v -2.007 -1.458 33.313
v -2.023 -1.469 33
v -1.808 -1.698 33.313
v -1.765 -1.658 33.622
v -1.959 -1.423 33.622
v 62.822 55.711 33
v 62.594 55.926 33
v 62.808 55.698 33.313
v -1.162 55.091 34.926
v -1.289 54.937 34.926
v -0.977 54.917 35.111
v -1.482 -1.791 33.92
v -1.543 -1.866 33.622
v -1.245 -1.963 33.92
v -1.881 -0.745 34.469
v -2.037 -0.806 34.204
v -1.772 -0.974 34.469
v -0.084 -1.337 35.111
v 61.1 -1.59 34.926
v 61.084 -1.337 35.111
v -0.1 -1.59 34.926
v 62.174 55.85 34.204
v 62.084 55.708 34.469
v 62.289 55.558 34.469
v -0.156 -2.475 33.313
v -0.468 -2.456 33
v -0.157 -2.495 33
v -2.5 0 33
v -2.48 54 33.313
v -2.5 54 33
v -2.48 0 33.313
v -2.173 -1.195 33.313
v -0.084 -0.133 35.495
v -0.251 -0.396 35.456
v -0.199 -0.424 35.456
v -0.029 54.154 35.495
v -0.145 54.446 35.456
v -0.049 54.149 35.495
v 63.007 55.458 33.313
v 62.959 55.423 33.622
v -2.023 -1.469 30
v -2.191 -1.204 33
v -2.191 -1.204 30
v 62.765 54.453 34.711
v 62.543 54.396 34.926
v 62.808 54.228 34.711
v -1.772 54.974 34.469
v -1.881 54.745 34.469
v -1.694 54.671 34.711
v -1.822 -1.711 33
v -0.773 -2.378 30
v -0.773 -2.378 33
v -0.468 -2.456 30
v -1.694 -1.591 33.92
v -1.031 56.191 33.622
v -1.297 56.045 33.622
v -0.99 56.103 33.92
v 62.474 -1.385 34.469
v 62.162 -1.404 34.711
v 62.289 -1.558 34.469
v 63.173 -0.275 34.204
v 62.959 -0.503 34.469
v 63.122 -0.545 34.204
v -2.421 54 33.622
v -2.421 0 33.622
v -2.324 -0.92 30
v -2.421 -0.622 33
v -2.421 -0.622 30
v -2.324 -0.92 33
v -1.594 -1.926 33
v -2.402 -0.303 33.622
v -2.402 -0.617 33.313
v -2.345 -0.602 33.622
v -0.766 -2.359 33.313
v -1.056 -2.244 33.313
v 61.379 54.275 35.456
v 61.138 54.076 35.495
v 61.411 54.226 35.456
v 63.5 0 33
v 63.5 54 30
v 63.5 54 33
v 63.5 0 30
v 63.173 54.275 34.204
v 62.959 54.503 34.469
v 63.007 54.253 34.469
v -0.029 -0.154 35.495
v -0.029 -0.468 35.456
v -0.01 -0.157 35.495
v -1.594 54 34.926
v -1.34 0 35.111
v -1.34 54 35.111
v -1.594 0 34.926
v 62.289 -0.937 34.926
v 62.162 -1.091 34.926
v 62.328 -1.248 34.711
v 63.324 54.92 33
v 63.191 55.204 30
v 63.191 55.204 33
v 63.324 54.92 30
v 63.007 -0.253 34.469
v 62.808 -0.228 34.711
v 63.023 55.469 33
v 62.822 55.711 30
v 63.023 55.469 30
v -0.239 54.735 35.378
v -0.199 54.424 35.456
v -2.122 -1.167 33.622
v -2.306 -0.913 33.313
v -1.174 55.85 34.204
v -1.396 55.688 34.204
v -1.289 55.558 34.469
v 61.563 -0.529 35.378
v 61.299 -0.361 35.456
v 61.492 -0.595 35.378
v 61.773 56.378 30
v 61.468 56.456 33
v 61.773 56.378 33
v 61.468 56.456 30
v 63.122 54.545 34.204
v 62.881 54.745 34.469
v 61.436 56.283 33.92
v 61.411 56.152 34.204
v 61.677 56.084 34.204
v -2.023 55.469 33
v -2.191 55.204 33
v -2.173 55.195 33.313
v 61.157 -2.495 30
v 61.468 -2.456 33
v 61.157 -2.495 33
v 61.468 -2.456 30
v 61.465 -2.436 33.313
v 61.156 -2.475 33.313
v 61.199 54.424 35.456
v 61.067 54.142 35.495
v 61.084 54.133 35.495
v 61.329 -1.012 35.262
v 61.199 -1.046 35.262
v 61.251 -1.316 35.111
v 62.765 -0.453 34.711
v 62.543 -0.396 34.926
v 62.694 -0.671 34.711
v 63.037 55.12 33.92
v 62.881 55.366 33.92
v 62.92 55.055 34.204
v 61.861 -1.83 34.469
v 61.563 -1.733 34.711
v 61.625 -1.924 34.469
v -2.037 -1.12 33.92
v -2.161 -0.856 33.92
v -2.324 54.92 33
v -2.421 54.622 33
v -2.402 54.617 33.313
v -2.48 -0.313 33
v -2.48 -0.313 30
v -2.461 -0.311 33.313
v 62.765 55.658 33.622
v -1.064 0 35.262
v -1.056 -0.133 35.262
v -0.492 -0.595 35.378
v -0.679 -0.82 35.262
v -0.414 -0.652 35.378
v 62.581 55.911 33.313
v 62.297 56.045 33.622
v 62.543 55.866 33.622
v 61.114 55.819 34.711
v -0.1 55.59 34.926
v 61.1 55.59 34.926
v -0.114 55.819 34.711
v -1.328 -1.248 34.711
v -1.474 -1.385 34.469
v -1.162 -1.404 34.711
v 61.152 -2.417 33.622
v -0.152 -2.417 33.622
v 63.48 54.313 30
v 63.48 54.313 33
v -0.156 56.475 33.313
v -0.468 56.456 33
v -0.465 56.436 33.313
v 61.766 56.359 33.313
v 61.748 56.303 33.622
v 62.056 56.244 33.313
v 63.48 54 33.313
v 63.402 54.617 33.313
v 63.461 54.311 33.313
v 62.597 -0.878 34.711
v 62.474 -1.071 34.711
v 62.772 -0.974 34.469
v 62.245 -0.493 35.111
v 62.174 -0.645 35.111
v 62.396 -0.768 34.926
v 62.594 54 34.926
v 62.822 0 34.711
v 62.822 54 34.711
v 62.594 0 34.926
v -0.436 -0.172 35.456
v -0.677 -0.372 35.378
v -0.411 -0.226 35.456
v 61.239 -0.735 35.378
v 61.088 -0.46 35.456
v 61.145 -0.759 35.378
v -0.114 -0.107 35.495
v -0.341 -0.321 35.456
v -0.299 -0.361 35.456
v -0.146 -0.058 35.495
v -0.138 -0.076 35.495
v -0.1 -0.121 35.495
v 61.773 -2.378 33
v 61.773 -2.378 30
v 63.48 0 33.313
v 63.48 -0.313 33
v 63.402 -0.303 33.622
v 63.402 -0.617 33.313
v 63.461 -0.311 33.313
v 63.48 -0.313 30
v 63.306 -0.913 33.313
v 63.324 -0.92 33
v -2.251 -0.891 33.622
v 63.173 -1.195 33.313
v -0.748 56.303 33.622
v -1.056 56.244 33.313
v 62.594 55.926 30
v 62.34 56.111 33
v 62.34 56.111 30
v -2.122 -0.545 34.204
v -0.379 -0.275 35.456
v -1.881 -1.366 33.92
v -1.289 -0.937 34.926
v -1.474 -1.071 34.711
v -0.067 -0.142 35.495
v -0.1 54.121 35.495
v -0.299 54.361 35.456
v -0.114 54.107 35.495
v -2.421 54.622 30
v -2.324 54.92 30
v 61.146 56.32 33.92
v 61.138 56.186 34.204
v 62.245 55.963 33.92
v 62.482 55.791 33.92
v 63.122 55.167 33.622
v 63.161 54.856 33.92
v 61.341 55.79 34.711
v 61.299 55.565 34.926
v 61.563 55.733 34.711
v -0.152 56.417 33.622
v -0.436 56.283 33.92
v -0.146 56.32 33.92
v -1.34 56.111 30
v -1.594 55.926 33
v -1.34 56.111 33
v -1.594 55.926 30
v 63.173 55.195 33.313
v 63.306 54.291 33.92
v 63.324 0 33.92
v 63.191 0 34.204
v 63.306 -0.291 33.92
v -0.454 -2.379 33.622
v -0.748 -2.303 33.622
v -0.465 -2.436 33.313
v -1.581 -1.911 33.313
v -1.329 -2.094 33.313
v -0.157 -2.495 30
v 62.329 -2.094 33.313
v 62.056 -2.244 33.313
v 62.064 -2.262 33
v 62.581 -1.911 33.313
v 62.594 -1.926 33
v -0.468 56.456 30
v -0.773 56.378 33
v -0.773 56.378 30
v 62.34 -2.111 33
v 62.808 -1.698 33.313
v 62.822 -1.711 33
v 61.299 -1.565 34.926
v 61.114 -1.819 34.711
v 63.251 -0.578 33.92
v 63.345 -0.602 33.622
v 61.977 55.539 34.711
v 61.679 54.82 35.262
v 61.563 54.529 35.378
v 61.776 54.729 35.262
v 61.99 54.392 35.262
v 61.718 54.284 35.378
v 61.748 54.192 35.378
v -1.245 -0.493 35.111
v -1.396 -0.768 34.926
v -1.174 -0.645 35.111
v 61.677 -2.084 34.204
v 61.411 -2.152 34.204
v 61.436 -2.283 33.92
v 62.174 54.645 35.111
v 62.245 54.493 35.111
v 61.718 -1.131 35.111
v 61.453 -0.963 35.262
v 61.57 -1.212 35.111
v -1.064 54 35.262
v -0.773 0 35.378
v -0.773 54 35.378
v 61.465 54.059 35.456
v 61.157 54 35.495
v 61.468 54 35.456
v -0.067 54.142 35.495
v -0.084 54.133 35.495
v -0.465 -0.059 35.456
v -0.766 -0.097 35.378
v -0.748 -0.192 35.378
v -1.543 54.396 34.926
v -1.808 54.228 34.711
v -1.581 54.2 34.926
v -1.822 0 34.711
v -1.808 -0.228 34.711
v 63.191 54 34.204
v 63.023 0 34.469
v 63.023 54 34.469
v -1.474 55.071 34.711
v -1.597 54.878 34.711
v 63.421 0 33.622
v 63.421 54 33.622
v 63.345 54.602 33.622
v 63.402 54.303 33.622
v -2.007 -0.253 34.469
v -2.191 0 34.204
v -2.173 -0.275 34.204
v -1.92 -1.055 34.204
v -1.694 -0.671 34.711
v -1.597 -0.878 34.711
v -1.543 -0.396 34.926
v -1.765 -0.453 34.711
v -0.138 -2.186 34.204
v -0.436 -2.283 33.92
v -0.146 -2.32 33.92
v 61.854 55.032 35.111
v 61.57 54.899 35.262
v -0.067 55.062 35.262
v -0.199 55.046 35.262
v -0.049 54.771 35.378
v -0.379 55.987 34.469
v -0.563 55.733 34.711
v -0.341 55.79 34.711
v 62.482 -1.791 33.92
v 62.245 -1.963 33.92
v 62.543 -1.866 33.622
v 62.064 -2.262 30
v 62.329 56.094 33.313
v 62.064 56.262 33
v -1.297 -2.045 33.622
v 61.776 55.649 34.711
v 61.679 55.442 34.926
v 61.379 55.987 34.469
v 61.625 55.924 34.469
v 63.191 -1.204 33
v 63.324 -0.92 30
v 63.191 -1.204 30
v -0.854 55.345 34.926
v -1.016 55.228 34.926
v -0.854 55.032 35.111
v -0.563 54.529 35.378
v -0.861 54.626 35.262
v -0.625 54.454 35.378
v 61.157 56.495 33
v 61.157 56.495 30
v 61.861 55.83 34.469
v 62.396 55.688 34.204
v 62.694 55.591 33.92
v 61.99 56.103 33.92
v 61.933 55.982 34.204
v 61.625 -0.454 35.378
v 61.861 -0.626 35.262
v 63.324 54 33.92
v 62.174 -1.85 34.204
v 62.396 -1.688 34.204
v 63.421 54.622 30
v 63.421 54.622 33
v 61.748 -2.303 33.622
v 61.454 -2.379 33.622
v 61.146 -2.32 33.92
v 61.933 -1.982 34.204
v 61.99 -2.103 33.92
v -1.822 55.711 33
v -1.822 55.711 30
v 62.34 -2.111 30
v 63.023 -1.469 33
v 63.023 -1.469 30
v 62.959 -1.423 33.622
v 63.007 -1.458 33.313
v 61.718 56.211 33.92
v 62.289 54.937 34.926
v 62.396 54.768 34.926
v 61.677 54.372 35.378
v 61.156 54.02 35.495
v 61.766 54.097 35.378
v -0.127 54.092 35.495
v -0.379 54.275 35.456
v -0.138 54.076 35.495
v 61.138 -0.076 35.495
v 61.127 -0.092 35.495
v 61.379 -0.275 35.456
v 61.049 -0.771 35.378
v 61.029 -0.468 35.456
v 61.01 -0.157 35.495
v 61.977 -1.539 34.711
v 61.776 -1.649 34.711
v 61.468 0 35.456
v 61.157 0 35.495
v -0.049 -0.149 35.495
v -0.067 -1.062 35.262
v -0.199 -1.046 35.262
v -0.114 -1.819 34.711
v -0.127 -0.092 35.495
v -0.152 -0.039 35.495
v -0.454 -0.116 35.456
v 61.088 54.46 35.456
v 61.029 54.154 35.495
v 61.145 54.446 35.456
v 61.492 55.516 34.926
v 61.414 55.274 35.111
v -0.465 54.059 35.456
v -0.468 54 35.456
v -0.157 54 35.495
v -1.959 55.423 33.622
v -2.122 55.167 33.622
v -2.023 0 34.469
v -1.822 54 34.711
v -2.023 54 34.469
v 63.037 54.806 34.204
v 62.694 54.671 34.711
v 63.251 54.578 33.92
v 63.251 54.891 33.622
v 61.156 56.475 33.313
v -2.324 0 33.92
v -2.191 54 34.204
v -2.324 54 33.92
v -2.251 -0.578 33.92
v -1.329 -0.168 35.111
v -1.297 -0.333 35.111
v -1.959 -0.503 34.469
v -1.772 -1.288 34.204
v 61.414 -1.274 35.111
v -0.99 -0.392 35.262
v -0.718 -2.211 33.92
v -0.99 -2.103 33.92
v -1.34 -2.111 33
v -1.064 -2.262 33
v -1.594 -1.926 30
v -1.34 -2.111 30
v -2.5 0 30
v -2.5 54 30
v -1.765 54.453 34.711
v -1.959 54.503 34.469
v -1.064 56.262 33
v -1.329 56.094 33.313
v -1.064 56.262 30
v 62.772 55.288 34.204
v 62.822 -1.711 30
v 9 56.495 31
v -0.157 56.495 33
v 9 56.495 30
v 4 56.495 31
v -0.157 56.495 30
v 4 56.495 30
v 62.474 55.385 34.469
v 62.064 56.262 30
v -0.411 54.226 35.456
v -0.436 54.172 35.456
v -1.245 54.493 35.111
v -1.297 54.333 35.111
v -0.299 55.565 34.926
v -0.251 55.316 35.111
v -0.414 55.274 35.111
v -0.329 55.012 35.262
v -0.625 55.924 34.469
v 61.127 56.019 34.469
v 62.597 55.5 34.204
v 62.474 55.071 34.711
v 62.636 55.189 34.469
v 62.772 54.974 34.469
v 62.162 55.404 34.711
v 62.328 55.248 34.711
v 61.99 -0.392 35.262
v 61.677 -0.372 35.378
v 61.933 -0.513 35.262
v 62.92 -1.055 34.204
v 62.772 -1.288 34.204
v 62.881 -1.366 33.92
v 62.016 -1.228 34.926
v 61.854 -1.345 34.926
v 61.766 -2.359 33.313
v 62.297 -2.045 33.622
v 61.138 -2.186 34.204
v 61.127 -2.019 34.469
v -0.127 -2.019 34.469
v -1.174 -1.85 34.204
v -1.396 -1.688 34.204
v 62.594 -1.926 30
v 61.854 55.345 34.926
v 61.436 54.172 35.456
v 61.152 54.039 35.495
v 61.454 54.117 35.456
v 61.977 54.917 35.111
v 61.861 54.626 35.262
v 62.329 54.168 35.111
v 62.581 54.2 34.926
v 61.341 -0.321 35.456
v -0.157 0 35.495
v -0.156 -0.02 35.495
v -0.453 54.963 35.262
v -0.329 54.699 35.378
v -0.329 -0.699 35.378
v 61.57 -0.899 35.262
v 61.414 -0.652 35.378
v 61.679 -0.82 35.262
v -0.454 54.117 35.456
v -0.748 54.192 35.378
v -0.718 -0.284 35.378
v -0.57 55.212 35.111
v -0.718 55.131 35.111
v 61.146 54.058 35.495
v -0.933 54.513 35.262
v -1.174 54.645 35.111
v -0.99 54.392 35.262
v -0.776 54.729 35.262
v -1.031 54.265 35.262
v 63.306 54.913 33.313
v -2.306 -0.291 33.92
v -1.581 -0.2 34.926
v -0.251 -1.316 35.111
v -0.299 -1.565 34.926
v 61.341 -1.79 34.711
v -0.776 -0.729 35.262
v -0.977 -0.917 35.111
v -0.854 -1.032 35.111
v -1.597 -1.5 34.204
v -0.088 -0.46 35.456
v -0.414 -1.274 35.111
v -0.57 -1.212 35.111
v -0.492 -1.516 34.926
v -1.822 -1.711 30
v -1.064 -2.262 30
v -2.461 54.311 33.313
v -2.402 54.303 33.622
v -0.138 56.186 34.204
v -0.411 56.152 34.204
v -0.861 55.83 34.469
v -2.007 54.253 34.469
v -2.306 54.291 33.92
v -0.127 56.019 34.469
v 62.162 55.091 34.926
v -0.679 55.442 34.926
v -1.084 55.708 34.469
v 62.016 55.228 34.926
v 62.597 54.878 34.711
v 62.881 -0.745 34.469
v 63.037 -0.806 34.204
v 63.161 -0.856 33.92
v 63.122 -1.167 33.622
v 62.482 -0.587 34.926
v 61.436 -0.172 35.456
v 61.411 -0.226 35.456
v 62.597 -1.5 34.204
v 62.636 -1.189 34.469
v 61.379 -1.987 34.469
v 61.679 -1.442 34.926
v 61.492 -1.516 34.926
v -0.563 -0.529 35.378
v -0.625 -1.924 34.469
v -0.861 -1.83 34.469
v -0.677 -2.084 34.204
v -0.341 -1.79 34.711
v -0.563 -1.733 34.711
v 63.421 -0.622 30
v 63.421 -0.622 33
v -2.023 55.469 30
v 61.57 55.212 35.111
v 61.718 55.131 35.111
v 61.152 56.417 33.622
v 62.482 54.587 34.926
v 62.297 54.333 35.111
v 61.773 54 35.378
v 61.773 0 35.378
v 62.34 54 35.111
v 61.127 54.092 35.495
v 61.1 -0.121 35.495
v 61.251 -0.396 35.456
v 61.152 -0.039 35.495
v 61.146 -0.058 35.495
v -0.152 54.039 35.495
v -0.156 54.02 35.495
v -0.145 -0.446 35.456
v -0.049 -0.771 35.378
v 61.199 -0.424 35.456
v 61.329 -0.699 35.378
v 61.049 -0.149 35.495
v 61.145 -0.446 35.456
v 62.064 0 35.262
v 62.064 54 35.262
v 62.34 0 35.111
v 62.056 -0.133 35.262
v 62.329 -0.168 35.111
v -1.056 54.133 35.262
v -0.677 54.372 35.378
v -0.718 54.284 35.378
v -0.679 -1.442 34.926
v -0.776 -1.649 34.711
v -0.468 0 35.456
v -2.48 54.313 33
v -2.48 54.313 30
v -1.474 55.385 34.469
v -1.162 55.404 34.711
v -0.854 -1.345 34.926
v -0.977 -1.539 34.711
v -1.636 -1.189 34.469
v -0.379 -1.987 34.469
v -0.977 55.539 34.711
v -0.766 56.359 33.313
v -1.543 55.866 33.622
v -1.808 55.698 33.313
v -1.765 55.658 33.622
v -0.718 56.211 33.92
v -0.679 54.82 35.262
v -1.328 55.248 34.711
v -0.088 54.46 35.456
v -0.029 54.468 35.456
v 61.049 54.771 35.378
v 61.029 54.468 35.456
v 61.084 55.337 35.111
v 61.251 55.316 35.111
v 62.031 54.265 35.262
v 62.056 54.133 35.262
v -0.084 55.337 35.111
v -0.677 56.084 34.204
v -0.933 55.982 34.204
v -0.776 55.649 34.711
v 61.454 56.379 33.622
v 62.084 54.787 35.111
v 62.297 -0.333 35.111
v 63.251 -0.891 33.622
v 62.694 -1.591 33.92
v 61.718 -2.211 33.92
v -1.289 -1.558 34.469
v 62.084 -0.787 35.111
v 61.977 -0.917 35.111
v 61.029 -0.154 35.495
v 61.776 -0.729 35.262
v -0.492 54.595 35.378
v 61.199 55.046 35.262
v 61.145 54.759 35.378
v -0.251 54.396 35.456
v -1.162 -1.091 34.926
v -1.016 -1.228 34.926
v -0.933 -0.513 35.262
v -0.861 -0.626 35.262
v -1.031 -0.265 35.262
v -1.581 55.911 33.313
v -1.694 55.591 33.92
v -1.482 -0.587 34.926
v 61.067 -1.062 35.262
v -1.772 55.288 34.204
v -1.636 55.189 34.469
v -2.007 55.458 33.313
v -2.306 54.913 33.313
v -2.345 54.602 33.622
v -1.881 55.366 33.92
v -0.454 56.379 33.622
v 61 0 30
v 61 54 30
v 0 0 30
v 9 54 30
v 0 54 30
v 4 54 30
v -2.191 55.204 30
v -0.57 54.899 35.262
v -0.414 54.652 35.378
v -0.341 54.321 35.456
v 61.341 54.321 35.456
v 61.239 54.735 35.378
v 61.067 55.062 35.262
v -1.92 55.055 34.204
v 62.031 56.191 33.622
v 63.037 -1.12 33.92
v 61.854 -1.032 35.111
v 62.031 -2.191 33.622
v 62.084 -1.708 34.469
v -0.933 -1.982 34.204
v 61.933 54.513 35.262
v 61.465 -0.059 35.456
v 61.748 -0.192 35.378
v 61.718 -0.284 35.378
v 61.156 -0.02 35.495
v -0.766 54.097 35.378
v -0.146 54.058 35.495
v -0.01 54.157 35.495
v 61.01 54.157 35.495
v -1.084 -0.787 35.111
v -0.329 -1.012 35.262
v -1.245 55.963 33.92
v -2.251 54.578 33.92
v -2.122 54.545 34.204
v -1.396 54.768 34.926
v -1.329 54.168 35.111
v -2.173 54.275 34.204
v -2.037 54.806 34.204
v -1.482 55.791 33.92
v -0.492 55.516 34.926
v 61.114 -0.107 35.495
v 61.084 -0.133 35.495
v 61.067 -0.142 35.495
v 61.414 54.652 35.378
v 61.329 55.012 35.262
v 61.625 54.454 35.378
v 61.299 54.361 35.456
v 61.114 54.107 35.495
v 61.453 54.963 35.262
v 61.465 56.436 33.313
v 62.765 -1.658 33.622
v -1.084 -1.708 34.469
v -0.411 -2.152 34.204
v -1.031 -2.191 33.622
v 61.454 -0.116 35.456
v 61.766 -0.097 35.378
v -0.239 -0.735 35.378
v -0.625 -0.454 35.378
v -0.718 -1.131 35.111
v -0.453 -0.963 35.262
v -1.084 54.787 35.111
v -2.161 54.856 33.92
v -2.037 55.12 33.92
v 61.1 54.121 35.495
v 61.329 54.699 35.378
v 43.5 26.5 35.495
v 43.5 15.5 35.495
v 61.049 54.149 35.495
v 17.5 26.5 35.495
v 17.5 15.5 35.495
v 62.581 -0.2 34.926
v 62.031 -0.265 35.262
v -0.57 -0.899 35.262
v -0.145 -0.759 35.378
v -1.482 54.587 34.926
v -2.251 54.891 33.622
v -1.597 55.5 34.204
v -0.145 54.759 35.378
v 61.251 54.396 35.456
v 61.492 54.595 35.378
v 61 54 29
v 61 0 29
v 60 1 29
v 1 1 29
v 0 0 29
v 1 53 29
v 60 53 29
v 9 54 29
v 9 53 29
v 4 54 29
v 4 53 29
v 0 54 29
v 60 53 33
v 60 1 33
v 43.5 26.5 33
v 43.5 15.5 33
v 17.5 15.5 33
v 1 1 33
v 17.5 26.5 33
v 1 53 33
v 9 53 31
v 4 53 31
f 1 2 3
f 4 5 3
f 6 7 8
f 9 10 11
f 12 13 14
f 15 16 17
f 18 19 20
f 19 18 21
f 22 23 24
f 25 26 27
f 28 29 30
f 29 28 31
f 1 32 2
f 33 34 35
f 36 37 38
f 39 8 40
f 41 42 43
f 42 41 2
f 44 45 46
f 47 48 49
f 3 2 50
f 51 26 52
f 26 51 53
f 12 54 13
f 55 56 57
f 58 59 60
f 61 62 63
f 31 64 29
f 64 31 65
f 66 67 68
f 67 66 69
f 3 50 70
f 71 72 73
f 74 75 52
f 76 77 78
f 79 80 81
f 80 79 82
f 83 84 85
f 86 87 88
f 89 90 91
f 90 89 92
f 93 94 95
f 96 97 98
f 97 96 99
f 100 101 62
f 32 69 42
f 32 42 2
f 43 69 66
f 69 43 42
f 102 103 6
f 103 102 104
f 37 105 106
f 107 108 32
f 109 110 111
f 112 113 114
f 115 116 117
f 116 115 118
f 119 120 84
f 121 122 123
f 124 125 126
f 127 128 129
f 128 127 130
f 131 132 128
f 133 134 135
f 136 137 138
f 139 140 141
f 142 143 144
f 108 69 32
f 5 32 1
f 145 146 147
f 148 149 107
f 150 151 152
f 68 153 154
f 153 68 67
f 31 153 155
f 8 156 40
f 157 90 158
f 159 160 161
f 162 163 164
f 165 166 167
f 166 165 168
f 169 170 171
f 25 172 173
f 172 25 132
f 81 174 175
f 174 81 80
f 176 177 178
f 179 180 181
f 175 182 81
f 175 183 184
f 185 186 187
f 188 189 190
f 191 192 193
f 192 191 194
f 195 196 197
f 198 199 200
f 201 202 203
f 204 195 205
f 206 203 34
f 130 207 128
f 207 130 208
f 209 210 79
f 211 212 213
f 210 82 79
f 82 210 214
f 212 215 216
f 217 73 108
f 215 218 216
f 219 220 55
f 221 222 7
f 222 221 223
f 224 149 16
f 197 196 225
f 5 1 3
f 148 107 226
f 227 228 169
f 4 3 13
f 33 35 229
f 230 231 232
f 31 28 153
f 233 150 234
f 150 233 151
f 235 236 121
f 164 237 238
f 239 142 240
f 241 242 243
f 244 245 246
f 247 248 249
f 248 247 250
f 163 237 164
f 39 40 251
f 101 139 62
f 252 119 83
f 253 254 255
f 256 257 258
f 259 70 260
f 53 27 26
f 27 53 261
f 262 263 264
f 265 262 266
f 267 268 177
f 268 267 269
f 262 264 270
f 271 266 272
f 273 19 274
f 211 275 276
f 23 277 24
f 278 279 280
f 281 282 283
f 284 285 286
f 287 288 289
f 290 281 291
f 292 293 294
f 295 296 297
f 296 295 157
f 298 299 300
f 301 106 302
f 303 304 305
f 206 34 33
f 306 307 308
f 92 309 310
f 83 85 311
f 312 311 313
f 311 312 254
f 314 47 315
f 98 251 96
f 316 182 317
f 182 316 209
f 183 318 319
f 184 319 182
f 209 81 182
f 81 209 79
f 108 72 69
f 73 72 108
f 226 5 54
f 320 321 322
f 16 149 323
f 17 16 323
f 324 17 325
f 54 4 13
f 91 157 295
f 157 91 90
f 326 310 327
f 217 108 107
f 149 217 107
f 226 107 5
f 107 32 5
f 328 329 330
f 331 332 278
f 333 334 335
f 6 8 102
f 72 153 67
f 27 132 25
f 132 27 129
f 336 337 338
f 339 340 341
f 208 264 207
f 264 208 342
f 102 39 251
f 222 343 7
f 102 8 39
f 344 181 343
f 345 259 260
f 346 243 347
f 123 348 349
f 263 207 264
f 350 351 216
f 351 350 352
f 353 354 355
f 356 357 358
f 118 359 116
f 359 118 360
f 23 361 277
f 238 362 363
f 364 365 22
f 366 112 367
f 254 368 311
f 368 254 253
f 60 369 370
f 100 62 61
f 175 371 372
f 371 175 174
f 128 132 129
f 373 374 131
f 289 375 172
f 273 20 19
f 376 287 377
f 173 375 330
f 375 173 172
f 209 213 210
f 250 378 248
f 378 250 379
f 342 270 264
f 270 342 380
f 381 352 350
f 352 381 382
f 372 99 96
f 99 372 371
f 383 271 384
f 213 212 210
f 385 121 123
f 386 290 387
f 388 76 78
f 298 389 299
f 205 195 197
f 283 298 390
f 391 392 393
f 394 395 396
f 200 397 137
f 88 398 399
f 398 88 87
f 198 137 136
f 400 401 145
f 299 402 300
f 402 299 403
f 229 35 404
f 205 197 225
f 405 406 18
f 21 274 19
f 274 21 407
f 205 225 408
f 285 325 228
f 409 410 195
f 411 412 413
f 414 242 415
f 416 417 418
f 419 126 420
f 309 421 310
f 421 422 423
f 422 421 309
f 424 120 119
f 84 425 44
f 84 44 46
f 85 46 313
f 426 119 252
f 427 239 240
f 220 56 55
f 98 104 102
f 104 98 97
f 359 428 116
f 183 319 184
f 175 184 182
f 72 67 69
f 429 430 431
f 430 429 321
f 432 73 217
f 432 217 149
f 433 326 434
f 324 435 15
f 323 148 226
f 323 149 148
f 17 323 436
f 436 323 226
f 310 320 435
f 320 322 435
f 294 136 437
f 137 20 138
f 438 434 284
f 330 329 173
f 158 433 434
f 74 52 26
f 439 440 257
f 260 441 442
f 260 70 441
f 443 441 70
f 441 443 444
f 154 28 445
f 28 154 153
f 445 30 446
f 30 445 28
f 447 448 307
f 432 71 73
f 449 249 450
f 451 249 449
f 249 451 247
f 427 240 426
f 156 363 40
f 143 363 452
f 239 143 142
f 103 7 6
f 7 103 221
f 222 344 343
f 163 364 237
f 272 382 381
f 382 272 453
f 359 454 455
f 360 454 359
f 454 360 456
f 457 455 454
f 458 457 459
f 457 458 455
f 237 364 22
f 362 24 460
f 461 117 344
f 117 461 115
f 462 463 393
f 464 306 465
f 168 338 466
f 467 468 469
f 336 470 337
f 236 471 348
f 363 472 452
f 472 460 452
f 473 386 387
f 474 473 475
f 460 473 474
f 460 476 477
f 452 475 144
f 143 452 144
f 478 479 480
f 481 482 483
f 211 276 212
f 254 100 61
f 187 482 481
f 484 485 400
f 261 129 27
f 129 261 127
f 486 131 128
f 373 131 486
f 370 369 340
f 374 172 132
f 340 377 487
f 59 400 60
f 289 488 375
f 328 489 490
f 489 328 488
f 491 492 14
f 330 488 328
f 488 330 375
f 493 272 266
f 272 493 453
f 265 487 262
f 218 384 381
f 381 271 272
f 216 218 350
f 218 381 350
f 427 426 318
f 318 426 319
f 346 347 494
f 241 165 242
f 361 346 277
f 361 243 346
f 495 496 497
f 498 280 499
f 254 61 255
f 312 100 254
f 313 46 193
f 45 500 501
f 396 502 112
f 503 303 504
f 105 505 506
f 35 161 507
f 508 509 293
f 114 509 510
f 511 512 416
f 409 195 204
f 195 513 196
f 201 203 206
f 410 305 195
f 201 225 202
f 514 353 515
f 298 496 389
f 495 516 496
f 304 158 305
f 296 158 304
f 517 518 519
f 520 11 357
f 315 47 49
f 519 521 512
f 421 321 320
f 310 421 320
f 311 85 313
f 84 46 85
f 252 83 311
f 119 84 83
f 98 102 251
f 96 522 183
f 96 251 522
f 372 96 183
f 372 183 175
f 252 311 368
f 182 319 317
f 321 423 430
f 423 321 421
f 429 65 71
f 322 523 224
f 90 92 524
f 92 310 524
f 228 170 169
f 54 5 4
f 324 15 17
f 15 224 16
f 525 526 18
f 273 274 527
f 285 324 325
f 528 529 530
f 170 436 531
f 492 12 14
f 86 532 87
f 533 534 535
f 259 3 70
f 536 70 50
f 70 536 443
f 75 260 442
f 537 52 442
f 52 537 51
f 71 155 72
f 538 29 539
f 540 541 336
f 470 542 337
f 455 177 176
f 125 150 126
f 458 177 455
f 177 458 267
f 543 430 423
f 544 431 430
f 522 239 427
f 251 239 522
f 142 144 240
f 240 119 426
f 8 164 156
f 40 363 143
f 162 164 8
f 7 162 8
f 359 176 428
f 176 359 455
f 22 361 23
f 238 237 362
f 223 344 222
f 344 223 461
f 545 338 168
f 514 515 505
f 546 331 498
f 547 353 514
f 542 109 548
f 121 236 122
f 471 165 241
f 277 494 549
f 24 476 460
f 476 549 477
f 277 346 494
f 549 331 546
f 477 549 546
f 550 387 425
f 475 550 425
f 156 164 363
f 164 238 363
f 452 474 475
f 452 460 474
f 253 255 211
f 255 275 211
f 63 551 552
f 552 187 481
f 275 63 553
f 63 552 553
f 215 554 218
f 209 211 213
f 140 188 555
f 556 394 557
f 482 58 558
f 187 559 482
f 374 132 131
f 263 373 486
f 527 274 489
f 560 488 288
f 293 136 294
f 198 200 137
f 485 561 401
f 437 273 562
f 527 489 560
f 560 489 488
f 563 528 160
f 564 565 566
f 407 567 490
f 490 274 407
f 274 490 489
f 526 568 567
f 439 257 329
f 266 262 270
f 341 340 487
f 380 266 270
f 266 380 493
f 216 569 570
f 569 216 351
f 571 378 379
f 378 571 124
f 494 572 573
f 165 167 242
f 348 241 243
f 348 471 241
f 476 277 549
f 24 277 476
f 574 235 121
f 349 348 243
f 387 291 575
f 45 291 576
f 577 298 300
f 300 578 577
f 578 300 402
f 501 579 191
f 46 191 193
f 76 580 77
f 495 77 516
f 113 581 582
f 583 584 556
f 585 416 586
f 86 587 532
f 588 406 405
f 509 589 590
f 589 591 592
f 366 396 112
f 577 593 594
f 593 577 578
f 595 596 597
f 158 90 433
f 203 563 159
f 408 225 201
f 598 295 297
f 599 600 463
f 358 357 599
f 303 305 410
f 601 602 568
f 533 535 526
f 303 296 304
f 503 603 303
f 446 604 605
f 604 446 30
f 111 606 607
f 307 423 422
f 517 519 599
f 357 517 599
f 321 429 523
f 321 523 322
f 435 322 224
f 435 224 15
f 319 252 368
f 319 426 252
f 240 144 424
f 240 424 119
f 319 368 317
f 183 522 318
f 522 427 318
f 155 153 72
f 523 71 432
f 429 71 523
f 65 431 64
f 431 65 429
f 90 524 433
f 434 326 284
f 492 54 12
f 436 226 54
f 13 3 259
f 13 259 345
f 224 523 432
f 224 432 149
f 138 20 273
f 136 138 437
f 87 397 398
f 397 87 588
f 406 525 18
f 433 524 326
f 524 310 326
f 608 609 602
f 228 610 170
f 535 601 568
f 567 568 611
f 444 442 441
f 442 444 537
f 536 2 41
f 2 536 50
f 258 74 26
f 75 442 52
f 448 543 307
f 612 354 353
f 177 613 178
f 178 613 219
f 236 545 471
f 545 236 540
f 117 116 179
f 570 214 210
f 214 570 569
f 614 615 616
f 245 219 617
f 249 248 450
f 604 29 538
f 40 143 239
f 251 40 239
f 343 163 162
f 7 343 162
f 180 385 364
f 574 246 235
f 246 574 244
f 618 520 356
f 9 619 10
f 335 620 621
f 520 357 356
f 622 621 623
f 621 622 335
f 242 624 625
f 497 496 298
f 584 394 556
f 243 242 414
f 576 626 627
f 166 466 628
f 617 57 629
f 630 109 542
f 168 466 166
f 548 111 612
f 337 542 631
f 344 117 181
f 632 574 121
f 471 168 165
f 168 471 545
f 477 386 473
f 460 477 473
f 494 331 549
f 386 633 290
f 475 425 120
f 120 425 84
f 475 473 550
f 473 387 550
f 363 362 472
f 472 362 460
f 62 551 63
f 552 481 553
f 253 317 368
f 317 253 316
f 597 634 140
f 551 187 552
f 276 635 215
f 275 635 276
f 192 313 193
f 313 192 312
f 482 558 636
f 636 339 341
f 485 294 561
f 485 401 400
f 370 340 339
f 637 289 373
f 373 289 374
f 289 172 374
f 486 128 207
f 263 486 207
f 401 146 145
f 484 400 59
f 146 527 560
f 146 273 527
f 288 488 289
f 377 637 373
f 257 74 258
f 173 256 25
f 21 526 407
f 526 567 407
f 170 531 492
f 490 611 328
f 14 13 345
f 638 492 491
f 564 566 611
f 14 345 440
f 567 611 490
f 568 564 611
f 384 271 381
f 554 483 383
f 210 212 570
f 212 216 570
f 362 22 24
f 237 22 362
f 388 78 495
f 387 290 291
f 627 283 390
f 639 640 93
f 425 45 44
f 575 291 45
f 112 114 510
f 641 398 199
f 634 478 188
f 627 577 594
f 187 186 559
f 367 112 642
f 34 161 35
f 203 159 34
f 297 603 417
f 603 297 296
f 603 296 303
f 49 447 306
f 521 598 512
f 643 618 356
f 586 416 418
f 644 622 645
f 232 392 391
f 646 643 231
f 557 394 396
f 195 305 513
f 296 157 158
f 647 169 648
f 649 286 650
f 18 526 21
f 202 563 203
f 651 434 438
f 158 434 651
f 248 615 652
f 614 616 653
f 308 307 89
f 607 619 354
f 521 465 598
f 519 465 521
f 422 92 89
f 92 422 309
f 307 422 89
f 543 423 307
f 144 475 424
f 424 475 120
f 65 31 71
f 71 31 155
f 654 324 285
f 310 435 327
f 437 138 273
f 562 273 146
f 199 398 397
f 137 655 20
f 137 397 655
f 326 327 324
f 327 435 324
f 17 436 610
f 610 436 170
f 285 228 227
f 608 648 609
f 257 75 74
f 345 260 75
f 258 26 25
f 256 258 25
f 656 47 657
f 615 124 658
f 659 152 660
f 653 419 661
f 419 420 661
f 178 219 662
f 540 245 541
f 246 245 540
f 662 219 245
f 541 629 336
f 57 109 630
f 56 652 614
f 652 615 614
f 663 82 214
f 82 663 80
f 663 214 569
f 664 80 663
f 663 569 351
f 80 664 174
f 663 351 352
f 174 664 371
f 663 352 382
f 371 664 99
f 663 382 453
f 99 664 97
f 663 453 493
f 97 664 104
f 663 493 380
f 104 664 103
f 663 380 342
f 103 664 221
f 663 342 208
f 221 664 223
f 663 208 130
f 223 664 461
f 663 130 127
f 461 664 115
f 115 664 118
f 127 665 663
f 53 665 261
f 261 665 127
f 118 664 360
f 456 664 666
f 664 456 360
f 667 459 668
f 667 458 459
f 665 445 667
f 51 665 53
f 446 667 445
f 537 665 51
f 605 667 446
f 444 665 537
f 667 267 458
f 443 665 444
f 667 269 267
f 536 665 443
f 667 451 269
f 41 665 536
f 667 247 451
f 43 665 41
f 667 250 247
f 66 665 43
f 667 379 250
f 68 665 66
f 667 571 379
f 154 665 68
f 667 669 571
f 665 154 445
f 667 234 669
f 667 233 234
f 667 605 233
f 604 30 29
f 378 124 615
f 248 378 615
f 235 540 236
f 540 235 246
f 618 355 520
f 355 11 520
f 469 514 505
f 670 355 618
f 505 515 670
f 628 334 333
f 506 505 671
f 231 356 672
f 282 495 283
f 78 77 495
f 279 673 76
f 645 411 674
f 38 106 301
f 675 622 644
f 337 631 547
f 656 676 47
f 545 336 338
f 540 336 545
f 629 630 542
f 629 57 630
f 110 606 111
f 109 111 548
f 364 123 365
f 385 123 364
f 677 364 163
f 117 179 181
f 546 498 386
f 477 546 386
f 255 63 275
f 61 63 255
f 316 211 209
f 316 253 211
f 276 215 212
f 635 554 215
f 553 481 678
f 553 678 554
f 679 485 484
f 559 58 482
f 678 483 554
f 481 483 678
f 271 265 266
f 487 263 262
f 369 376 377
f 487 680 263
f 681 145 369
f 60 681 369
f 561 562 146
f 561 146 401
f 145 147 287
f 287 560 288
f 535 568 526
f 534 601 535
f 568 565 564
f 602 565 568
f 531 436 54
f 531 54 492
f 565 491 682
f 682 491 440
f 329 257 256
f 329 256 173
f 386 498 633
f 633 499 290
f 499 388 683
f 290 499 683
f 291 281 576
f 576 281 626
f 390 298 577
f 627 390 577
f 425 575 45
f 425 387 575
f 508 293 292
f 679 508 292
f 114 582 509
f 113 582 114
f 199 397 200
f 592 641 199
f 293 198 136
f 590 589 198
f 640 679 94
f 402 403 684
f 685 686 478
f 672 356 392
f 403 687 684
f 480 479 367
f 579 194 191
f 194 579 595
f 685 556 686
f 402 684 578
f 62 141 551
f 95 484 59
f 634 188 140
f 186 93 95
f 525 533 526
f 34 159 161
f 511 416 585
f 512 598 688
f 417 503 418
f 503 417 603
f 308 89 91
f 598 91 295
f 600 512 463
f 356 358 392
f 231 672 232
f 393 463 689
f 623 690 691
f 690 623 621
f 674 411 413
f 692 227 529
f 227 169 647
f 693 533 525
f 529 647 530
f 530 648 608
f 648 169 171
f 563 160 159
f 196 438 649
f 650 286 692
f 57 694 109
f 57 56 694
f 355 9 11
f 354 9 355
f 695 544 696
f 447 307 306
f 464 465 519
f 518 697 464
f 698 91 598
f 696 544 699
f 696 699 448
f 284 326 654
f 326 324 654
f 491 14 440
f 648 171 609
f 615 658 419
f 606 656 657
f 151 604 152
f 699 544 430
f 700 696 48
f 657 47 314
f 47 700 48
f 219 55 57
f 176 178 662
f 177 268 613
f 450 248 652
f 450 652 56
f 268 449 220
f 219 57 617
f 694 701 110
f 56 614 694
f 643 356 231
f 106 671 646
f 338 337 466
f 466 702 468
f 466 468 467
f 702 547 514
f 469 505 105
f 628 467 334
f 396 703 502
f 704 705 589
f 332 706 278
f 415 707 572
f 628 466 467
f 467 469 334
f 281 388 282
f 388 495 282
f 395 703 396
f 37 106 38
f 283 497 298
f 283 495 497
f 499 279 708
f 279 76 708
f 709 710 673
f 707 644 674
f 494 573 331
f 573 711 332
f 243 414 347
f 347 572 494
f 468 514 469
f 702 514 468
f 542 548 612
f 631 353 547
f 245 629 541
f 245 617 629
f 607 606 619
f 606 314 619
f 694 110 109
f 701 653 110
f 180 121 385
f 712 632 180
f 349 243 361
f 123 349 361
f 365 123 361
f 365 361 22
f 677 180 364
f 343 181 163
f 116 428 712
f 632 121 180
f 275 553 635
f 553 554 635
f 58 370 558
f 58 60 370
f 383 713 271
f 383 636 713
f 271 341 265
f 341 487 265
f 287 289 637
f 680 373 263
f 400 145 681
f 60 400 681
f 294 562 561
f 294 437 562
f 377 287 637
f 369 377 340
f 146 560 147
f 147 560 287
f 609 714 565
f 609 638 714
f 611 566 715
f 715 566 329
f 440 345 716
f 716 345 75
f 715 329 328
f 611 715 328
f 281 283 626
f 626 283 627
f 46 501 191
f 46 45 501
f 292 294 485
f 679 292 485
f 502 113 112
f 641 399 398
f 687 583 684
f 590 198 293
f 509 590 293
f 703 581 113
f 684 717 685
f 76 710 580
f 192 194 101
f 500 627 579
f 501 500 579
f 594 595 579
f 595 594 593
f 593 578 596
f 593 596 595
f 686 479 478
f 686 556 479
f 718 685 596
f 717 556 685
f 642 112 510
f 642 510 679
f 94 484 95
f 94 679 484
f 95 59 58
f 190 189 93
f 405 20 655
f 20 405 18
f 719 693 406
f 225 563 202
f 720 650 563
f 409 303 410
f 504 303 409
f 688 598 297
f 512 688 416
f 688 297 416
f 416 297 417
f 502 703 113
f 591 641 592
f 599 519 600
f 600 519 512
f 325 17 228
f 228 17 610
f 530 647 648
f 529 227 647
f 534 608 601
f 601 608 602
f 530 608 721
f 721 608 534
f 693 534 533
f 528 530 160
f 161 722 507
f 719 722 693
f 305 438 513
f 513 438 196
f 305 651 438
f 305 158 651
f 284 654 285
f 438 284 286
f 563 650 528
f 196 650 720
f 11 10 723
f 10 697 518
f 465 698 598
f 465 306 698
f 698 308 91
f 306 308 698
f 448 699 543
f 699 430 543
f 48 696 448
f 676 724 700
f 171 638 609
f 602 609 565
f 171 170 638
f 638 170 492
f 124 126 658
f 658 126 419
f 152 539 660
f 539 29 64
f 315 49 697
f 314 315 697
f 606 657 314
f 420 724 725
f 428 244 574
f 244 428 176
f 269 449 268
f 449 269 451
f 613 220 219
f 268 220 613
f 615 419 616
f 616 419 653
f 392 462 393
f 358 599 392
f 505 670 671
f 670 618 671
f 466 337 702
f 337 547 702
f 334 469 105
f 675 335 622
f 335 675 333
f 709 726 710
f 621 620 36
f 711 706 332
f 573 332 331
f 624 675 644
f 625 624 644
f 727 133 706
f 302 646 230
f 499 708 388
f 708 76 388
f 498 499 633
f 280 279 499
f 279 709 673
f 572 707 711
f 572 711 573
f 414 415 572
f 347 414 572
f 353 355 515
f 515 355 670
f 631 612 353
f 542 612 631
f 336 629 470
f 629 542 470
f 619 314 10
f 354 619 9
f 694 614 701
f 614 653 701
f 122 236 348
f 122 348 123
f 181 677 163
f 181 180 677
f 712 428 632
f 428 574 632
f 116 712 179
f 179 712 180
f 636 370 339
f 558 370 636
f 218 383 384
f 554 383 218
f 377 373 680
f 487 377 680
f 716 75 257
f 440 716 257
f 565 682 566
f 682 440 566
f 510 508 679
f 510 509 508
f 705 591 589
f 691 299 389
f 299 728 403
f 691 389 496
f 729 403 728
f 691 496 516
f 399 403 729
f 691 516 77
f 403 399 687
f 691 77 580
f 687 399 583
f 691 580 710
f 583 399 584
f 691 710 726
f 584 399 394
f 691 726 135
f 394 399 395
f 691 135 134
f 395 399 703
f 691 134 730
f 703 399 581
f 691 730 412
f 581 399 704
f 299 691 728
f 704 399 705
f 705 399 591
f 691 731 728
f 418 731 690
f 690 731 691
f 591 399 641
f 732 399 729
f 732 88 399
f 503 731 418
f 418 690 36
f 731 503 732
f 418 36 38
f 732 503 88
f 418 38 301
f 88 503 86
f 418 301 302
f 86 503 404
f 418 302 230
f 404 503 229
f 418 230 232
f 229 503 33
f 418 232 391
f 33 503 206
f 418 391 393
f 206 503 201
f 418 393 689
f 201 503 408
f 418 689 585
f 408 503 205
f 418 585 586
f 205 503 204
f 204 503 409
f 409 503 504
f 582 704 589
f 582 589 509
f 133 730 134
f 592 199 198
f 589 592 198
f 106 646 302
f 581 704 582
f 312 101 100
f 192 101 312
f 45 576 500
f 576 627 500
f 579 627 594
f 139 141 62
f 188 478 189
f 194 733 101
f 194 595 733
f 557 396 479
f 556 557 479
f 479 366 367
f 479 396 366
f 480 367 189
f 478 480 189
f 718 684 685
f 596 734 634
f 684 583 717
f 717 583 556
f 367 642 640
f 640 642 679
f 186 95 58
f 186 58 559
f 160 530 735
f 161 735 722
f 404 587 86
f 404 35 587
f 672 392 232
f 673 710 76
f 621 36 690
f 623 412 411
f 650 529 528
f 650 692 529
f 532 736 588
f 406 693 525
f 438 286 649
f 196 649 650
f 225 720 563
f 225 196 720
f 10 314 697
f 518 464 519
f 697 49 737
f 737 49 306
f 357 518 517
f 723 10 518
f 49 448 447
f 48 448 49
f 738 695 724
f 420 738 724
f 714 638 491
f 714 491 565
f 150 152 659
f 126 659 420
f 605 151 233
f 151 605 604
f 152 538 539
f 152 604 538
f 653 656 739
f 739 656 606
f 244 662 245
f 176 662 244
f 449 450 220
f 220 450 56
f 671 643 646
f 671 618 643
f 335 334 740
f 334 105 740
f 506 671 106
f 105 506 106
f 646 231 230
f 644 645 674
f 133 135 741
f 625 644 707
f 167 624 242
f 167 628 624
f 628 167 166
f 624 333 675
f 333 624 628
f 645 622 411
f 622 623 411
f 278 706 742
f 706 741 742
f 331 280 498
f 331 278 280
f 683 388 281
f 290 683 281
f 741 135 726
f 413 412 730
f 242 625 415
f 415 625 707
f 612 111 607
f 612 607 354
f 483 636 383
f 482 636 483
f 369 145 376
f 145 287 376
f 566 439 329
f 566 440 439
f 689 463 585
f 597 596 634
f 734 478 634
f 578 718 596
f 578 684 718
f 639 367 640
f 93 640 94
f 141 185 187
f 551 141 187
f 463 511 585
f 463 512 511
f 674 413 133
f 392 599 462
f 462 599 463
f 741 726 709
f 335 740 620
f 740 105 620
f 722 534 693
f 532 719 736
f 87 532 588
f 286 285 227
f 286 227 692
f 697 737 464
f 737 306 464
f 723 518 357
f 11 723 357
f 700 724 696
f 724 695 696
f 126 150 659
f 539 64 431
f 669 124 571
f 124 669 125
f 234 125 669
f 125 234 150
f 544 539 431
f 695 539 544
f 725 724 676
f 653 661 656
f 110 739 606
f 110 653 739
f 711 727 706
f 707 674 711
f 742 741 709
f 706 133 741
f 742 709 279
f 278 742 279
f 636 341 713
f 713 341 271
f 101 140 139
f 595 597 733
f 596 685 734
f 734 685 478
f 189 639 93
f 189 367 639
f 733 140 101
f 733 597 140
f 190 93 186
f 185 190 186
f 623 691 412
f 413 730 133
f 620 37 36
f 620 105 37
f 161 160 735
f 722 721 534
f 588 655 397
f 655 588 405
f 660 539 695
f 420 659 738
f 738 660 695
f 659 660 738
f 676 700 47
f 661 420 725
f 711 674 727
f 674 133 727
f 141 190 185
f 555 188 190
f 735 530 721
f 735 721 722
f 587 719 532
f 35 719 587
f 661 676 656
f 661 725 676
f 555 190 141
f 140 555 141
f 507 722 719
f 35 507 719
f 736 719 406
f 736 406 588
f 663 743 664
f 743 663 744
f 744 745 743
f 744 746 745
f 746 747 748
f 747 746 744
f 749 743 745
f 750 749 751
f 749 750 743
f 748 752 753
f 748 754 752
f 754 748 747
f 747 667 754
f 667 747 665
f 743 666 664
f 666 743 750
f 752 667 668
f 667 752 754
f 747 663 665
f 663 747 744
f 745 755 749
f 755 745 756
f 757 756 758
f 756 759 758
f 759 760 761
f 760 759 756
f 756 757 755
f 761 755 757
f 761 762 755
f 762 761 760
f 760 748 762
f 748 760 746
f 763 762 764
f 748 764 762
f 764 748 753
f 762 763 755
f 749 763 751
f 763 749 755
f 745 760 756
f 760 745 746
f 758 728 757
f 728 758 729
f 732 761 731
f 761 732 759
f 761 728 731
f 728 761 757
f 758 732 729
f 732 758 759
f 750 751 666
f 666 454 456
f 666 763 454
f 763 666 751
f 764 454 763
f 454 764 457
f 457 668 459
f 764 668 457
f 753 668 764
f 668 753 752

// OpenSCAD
$fn=50;


//box(61,54,20,2.5);

translate([0,0,30])lid(61,54,3,2.5);
module box(width, depth, height, wall){
    difference(){
        hull(){
            translate([0,0,0])cylinder(r=wall,h=wall+height);
            translate([width,0,0])cylinder(r=wall,h=wall+height);
            translate([width,depth,0])cylinder(r=wall,h=wall+height);
            translate([0,depth,0])cylinder(r=wall,h=wall+height);
        }
        translate([0,0,wall])cube([width,depth,height+0.01]);
        
        translate([width-7-9,-wall-1,wall+4])cube([10,10,11]);
        translate([width-10,depth,wall+10])rotate([-90,0,0])cylinder(d=7,h=20);
        translate([28,depth,14+wall])cube([12,20,10]);
    }
    
}

module lid(width,depth,height,wall){
    difference(){
        union(){hull(){
            translate([0,0,0])cylinder(r=wall,h=height);
            translate([width,0,0])cylinder(r=wall,h=height);
            translate([width,depth,0])cylinder(r=wall,h=height);
            translate([0,depth,0])cylinder(r=wall,h=height);
            translate([0,0,height])sphere(r=wall);
            translate([width,0,height])sphere(r=wall);
            translate([width,depth,height])sphere(r=wall);
            translate([0,depth,height])sphere(r=wall);
        }
        translate([0,0,-1])cube([width,depth,height]);}
        translate([1,1,-1.01])cube([width-2,depth-2,height+1.01]);
        
        translate([17.5,15.5,0])cube([26,11,30]);
        translate([4,50,-3])cube([5,20,4]);
    }
}
        
